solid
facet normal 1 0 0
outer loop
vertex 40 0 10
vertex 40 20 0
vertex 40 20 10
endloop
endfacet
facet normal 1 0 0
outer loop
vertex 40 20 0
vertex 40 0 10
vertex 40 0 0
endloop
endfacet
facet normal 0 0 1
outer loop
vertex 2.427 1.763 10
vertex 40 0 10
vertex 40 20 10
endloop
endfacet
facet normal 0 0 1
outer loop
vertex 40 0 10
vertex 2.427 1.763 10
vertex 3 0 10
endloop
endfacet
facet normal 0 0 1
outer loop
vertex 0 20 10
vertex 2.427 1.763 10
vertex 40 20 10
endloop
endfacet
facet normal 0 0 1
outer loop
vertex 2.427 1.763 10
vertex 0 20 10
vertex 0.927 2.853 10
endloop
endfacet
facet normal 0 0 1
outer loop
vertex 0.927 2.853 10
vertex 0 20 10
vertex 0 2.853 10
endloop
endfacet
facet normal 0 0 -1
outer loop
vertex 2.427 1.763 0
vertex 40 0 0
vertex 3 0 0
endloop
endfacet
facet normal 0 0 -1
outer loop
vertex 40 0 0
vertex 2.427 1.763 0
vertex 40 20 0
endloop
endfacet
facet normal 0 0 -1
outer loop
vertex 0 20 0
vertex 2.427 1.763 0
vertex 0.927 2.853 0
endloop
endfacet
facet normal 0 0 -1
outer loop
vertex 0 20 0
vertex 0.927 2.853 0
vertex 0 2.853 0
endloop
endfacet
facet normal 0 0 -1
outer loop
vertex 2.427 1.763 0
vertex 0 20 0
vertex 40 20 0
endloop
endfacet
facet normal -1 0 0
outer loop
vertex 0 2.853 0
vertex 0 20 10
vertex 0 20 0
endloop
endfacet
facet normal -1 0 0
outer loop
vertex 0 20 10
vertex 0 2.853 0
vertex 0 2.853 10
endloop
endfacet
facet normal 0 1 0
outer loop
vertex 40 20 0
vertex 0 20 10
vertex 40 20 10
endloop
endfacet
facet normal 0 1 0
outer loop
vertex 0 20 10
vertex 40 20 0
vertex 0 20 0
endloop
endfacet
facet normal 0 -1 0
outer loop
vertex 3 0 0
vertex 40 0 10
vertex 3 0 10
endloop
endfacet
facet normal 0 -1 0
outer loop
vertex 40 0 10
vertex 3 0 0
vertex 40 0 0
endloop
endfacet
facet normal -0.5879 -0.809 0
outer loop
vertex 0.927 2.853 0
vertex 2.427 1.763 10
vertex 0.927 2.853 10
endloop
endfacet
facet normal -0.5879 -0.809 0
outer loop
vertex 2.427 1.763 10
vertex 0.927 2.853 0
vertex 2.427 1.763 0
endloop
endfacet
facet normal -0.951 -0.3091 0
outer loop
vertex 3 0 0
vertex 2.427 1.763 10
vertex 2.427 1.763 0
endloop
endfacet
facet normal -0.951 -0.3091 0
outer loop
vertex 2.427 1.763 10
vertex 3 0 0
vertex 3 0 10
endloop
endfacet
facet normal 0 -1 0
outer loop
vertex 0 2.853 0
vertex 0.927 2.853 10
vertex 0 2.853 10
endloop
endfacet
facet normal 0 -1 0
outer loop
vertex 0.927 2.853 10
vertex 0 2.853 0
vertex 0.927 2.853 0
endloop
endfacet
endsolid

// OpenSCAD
// Groove cut with a wrong-typed center vector (issue #436).
// OpenSCAD takes center as a boolean; the vector is silently ignored.
difference() {
  cube(size = [40, 20, 10], center = [true, true, true]);
  translate([0, 0, 5]) cylinder(h = 12, r = 3, center = true);
}
